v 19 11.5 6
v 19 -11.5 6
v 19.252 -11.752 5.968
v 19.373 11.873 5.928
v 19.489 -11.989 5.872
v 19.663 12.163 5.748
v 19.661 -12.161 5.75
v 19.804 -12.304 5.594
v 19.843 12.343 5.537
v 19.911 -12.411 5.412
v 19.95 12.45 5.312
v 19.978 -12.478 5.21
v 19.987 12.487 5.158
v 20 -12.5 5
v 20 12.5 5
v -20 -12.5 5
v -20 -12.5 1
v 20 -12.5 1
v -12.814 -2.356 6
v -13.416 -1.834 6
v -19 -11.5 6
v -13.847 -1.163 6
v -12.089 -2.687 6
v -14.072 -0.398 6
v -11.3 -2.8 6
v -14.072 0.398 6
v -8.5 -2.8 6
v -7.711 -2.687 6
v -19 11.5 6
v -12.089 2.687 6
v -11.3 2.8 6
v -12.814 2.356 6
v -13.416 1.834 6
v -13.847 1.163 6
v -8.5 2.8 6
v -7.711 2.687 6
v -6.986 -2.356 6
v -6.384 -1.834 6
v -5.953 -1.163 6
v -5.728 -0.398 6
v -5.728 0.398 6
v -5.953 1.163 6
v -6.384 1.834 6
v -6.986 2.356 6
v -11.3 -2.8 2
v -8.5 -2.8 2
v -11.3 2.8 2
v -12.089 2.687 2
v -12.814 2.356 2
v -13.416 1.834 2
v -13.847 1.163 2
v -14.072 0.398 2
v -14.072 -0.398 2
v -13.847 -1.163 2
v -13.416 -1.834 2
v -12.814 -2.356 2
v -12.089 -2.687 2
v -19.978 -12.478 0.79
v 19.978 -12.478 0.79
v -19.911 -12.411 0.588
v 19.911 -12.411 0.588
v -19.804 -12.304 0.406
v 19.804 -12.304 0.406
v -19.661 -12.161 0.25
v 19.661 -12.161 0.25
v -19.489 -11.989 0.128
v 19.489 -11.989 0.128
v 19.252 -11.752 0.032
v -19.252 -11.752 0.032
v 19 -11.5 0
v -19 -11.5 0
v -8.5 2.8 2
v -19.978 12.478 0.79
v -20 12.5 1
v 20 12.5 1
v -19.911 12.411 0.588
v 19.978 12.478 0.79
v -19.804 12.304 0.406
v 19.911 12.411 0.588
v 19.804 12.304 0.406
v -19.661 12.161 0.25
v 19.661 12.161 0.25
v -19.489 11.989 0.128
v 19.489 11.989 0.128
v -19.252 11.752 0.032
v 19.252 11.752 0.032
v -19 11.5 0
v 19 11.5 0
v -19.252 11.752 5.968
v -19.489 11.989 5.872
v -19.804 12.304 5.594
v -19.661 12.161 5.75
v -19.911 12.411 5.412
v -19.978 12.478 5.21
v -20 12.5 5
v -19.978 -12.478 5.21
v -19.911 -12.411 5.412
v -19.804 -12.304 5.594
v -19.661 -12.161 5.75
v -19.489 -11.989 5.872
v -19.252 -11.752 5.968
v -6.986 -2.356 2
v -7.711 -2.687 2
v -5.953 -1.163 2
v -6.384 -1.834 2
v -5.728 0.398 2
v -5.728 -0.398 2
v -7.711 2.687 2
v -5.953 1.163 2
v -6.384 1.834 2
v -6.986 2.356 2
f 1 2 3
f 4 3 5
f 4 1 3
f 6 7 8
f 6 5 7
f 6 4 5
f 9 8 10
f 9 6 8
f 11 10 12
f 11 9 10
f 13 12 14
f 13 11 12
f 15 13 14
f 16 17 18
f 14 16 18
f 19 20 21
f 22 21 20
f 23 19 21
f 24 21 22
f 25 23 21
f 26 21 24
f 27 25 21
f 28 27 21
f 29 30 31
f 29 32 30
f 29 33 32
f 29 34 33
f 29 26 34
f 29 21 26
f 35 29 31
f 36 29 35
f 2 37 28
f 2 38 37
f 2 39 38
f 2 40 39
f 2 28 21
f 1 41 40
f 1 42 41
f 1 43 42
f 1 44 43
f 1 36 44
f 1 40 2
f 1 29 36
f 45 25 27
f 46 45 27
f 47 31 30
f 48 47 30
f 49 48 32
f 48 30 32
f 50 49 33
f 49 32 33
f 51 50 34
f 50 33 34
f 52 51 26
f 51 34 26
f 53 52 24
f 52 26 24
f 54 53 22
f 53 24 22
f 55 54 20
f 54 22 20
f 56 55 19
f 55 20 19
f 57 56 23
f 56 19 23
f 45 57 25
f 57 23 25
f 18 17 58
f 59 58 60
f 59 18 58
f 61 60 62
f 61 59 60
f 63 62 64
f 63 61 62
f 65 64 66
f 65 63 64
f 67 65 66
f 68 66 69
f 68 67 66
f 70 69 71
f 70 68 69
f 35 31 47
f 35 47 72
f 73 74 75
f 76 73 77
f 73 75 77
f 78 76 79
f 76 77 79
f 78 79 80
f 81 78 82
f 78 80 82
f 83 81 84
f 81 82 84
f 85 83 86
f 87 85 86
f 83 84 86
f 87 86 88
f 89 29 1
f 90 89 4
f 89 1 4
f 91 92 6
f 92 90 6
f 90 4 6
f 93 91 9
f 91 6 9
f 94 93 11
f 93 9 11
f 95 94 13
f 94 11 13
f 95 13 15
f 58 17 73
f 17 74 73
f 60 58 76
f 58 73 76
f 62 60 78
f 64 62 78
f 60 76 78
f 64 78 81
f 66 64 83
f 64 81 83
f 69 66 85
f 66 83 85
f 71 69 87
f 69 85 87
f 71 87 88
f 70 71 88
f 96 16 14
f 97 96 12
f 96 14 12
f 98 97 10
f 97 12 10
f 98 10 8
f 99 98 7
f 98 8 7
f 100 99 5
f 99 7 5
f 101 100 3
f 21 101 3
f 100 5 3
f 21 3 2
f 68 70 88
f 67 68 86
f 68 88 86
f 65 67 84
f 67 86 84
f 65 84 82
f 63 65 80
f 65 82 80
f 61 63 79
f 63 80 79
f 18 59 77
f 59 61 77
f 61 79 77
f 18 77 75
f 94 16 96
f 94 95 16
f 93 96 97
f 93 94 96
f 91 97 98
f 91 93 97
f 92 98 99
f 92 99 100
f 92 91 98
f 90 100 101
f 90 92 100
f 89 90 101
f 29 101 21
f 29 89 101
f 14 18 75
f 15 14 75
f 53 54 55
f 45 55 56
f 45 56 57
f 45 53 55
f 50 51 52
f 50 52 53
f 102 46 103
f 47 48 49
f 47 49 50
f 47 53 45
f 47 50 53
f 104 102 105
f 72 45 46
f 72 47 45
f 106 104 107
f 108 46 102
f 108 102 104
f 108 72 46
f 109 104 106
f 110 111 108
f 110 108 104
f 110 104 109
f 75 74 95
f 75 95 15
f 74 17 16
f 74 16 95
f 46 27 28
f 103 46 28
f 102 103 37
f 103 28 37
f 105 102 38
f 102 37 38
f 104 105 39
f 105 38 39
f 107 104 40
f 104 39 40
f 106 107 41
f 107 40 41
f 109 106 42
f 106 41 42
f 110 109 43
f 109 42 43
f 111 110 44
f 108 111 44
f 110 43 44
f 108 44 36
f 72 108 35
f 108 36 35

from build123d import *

# Parameters (mm, degrees)
SKETCH_W     = 40
SKETCH_H     = 25
PAD_DEPTH    = 6
POCKET_DEPTH = 4
FILLET_R     = 1
FILLET001_R  = 1


with BuildPart() as part:
    # Sketch → Pad (new body)
    with BuildSketch(Plane.XY):
        Rectangle(SKETCH_W, SKETCH_H)
    extrude(amount=PAD_DEPTH)

    # Sketch001 → Pocket (cut)
    with BuildSketch(Plane.XY.offset(6)):
        with BuildLine():
            ThreePointArc((-11.3, 2.8), (-14.1, 0), (-11.3, -2.8))
            Line((-11.3, -2.8), (-8.5, -2.8))
            ThreePointArc((-8.5, -2.8), (-5.7, 0), (-8.5, 2.8))
            Line((-11.3, 2.8), (-8.5, 2.8))
        make_face()
    extrude(amount=-POCKET_DEPTH, mode=Mode.SUBTRACT)

    # Fillet
    fillet_edges = [part.edges().sort_by_distance(p)[0] for p in [
        (-20, 0, 0),
        (0, 12.5, 0),
        (0, -12.5, 0),
        (20, 0, 0),
    ]]
    fillet(fillet_edges, radius=FILLET_R)

    # Fillet001
    fillet001_edges = [part.edges().sort_by_distance(p)[0] for p in [
        (0, -12.5, 6),
        (-20, 0, 6),
        (0, 12.5, 6),
        (20, 0, 6),
    ]]
    fillet(fillet001_edges, radius=FILLET001_R)


solid = part.part
